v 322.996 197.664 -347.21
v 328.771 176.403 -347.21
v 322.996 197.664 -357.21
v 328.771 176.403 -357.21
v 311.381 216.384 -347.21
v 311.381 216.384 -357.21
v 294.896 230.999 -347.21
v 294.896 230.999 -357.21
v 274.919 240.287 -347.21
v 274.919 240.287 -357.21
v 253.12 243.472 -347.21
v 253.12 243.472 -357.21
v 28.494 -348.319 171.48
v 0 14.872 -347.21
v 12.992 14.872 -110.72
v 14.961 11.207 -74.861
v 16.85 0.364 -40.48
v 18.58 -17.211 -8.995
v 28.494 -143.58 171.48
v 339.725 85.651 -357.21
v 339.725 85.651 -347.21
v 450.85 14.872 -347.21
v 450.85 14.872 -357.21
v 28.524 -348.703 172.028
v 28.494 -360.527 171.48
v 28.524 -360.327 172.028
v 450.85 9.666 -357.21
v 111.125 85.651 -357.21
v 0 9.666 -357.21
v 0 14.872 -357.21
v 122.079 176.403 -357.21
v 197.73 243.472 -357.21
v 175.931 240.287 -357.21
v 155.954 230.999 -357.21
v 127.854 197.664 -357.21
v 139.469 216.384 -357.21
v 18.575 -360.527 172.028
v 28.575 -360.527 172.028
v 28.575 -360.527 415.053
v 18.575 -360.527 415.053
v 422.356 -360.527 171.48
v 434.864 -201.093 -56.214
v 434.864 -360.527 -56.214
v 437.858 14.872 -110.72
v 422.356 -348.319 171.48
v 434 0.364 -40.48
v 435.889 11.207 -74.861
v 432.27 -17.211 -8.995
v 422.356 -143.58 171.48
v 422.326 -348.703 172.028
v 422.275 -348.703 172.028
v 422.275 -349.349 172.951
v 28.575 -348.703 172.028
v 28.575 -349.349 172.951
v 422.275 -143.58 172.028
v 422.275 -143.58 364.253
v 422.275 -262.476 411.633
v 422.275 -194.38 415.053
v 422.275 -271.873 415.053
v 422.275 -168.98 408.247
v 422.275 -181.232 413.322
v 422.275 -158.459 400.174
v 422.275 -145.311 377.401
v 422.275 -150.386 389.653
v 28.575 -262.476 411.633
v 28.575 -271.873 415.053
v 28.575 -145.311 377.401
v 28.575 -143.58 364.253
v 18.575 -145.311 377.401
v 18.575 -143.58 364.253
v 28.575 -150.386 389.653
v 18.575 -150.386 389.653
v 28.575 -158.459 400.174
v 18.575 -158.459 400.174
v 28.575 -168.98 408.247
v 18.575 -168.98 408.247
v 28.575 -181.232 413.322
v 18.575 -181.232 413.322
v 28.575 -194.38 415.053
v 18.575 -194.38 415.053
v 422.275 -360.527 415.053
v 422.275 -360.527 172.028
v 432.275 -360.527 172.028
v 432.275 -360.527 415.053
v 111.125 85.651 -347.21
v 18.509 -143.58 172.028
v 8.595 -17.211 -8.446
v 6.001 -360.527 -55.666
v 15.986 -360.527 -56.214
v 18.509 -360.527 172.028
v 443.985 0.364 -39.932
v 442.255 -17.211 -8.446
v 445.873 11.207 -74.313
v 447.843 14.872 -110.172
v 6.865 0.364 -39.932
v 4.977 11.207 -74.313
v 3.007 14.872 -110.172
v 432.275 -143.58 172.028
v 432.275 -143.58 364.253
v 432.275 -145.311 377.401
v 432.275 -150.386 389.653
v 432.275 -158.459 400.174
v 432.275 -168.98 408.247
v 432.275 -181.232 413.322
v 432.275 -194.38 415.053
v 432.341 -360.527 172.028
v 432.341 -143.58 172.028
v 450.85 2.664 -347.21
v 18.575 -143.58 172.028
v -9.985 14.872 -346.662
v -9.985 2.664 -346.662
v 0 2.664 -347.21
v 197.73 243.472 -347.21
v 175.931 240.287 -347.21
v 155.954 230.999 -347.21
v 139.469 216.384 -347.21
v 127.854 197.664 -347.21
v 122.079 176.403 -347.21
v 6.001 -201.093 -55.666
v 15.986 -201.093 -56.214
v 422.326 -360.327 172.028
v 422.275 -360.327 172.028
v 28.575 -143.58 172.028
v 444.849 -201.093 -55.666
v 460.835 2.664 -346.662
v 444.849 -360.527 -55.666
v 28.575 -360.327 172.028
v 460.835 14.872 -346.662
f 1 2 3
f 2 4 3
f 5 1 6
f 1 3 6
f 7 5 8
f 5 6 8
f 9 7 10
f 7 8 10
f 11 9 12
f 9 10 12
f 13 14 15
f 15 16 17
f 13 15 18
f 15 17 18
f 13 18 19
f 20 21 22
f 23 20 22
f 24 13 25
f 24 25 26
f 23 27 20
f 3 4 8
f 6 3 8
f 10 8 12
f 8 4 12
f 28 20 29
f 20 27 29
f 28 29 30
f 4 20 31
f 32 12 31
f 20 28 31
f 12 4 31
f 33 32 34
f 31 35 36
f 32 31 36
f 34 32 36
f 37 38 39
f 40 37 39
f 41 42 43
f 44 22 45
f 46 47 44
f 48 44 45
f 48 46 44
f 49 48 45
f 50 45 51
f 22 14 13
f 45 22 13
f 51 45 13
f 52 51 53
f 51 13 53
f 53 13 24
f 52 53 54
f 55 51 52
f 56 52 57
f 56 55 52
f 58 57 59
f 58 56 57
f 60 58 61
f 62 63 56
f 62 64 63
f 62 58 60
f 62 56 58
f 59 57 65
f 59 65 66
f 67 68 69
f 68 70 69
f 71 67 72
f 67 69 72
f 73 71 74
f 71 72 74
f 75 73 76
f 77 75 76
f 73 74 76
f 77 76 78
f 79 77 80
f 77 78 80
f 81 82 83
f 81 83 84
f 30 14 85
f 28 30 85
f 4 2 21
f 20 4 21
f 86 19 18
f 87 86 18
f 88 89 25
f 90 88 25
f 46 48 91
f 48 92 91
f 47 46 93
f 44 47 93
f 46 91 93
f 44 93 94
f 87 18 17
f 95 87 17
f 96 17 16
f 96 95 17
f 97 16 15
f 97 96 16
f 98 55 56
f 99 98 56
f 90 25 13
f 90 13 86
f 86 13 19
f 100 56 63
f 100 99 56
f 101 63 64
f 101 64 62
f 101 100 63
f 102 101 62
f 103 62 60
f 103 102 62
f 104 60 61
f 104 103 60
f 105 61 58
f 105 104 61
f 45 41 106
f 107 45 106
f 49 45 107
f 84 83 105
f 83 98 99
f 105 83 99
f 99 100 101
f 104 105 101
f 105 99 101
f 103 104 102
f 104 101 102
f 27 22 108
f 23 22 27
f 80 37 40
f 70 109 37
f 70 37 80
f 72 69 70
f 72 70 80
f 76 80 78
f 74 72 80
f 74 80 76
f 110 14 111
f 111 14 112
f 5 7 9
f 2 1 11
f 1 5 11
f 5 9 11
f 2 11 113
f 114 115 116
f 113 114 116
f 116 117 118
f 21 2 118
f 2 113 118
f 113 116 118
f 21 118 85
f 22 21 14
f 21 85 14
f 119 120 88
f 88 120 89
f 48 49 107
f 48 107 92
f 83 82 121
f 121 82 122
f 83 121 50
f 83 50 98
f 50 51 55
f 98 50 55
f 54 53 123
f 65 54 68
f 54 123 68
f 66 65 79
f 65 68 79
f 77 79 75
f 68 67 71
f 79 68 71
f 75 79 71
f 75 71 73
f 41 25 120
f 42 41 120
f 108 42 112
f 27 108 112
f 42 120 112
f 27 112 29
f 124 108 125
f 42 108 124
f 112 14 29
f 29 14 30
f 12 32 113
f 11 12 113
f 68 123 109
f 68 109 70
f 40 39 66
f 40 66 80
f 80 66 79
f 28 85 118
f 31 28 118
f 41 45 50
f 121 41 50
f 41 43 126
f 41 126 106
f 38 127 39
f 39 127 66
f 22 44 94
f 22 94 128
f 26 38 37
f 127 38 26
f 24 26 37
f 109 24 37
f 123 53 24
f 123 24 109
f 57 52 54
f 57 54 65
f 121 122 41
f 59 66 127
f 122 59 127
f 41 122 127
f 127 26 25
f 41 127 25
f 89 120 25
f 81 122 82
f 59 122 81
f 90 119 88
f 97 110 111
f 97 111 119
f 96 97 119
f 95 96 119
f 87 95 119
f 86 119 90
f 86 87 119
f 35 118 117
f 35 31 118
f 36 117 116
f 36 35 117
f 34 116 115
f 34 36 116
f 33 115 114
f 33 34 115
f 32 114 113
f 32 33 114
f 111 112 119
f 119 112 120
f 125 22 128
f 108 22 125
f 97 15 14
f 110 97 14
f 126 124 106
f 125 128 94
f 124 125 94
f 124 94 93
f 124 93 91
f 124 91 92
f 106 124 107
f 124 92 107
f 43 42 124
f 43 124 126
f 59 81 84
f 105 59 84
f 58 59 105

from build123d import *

# Parameters (mm, degrees)
BOSS_EXTRUDE1_DEPTH     = 450.85
CUT_EXTRUDE2_DEPTH      = 508
FILLET1_R               = 76.2
SKETCH8_W               = 28.575
SKETCH8_H               = 250.515691668
CUT_EXTRUDE3_DEPTH      = 244.471906543
CUT_EXTRUDE3_DEPTH_BACK = 361.52650092
BOSS_EXTRUDE4_DEPTH     = 10
SKETCH11_W              = 243.025134326
SKETCH11_H              = 216.946269836
BOSS_EXTRUDE5_DEPTH     = 10
FILLET2_R               = 177.8
FILLET3_R               = 50.8
FILLET2_OF_MIRROR1_R    = 177.8
FILLET3_OF_MIRROR1_R    = 50.8


with BuildPart() as part:
    # Sketch1 → Boss-Extrude1 (new body)
    with BuildSketch(Plane(origin=(0, 0, 0), x_dir=(0, 0, -1), z_dir=(1, 0, 0))):
        Polygon((-172.951120204, -349.34913054), (-411.633045884, -262.476014135), (-415.053247317, -271.872940343), (-171.479591477, -360.52650092), (357.210427919, 9.666236038), (357.210427919, 243.471906543), (347.210427919, 243.471906543), (347.210427919, 14.871906543), align=None)
    extrude(amount=BOSS_EXTRUDE1_DEPTH)

    # Sketch3 → Cut-Extrude2 (cut)
    with BuildSketch(Plane.XY.offset(-347.210427919)):
        Polygon((450.85, 243.471906543), (320.675, 243.471906543), (339.725, 85.650531553), (450.85, 14.871906543), align=None)
        Polygon((111.125, 85.650531553), (130.175, 243.471906543), (0, 243.471906543), (0, 14.871906543), align=None)
    extrude(amount=-CUT_EXTRUDE2_DEPTH, mode=Mode.SUBTRACT)

    # Fillet1
    fillet1_edges = [part.edges().sort_by_distance(p)[0] for p in [
        (320.675, 243.471906543, -352.210427919),
        (130.175, 243.471906543, -352.210427919),
    ]]
    fillet(fillet1_edges, radius=FILLET1_R)

    # Sketch8 → Cut-Extrude3 (cut, two sides)
    with BuildSketch(Plane(origin=(0, 0, 0), x_dir=(1, 0, 0), z_dir=(0, 1, 0))) as cut_extrude3_sk:
        Polygon((0, -172.951120204), (0, 347.210427919), (28.575, -172.951120204), align=None)
        Polygon((422.275, -172.951120204), (450.85, -172.951120204), (450.85, 347.210427919), align=None)
        with Locations((436.5625, -298.208966038)):
            Rectangle(SKETCH8_W, SKETCH8_H)
        with Locations((14.2875, -298.208966038)):
            Rectangle(SKETCH8_W, SKETCH8_H)
    extrude(amount=CUT_EXTRUDE3_DEPTH, mode=Mode.SUBTRACT)
    extrude(cut_extrude3_sk.sketch, amount=-CUT_EXTRUDE3_DEPTH_BACK, mode=Mode.SUBTRACT)

    # Sketch9 → Boss-Extrude4 (add)
    with BuildSketch(Plane(origin=(19.016566107, 0, -1.04467233), x_dir=(0.054852151, 0, 0.998494487), z_dir=(-0.998494487, 0, 0.054852151))):
        Polygon((-53.849912427, 14.871906543), (-346.687698266, 14.871906543), (172.784392877, -348.318755032), (172.784392877, -143.580231084), align=None)
        Polygon((172.784392877, -360.52650092), (-55.252957085, -201.093419897), (-55.252957085, -360.52650092), align=None)
        Polygon((172.784392877, -348.318755032), (-346.687698266, 14.871906543), (-346.687698266, 2.664160656), (-55.252957085, -201.093419897), (172.784392877, -360.52650092), align=None)
    boss_extrude4 = extrude(amount=BOSS_EXTRUDE4_DEPTH)

    # Sketch11 → Boss-Extrude5 (add)
    with BuildSketch(Plane.ZY.offset(-28.575)):
        with Locations((293.540680154, -252.053366002)):
            Rectangle(SKETCH11_W, SKETCH11_H)
    boss_extrude5 = extrude(amount=BOSS_EXTRUDE5_DEPTH)

    # Fillet2
    fillet2_edges = [part.edges().sort_by_distance(p)[0] for p in [
        (11.070310121, 14.871906543, -54.539252282),
    ]]
    fillet(fillet2_edges, radius=FILLET2_R)

    # Fillet3
    fillet3_edges = [part.edges().sort_by_distance(p)[0] for p in [
        (23.575, -143.580231084, 415.053247317),
    ]]
    fillet(fillet3_edges, radius=FILLET3_R)

    # Mirror1: Boss-Extrude4, Boss-Extrude5 across plane
    add(boss_extrude4.mirror(Plane(origin=(225.425, 0, 0), x_dir=(0, 0, 1), z_dir=(1, 0, 0))))
    add(boss_extrude5.mirror(Plane(origin=(225.425, 0, 0), x_dir=(0, 0, 1), z_dir=(1, 0, 0))))

    # Fillet2 of Mirror1
    fillet2_of_mirror1_edges = [part.edges().sort_by_distance(p)[0] for p in [
        (439.779689879, 14.871906543, -54.539252282),
    ]]
    fillet(fillet2_of_mirror1_edges, radius=FILLET2_OF_MIRROR1_R)

    # Fillet3 of Mirror1
    fillet3_of_mirror1_edges = [part.edges().sort_by_distance(p)[0] for p in [
        (427.275, -143.580231084, 415.053247317),
    ]]
    fillet(fillet3_of_mirror1_edges, radius=FILLET3_OF_MIRROR1_R)


solid = part.part
